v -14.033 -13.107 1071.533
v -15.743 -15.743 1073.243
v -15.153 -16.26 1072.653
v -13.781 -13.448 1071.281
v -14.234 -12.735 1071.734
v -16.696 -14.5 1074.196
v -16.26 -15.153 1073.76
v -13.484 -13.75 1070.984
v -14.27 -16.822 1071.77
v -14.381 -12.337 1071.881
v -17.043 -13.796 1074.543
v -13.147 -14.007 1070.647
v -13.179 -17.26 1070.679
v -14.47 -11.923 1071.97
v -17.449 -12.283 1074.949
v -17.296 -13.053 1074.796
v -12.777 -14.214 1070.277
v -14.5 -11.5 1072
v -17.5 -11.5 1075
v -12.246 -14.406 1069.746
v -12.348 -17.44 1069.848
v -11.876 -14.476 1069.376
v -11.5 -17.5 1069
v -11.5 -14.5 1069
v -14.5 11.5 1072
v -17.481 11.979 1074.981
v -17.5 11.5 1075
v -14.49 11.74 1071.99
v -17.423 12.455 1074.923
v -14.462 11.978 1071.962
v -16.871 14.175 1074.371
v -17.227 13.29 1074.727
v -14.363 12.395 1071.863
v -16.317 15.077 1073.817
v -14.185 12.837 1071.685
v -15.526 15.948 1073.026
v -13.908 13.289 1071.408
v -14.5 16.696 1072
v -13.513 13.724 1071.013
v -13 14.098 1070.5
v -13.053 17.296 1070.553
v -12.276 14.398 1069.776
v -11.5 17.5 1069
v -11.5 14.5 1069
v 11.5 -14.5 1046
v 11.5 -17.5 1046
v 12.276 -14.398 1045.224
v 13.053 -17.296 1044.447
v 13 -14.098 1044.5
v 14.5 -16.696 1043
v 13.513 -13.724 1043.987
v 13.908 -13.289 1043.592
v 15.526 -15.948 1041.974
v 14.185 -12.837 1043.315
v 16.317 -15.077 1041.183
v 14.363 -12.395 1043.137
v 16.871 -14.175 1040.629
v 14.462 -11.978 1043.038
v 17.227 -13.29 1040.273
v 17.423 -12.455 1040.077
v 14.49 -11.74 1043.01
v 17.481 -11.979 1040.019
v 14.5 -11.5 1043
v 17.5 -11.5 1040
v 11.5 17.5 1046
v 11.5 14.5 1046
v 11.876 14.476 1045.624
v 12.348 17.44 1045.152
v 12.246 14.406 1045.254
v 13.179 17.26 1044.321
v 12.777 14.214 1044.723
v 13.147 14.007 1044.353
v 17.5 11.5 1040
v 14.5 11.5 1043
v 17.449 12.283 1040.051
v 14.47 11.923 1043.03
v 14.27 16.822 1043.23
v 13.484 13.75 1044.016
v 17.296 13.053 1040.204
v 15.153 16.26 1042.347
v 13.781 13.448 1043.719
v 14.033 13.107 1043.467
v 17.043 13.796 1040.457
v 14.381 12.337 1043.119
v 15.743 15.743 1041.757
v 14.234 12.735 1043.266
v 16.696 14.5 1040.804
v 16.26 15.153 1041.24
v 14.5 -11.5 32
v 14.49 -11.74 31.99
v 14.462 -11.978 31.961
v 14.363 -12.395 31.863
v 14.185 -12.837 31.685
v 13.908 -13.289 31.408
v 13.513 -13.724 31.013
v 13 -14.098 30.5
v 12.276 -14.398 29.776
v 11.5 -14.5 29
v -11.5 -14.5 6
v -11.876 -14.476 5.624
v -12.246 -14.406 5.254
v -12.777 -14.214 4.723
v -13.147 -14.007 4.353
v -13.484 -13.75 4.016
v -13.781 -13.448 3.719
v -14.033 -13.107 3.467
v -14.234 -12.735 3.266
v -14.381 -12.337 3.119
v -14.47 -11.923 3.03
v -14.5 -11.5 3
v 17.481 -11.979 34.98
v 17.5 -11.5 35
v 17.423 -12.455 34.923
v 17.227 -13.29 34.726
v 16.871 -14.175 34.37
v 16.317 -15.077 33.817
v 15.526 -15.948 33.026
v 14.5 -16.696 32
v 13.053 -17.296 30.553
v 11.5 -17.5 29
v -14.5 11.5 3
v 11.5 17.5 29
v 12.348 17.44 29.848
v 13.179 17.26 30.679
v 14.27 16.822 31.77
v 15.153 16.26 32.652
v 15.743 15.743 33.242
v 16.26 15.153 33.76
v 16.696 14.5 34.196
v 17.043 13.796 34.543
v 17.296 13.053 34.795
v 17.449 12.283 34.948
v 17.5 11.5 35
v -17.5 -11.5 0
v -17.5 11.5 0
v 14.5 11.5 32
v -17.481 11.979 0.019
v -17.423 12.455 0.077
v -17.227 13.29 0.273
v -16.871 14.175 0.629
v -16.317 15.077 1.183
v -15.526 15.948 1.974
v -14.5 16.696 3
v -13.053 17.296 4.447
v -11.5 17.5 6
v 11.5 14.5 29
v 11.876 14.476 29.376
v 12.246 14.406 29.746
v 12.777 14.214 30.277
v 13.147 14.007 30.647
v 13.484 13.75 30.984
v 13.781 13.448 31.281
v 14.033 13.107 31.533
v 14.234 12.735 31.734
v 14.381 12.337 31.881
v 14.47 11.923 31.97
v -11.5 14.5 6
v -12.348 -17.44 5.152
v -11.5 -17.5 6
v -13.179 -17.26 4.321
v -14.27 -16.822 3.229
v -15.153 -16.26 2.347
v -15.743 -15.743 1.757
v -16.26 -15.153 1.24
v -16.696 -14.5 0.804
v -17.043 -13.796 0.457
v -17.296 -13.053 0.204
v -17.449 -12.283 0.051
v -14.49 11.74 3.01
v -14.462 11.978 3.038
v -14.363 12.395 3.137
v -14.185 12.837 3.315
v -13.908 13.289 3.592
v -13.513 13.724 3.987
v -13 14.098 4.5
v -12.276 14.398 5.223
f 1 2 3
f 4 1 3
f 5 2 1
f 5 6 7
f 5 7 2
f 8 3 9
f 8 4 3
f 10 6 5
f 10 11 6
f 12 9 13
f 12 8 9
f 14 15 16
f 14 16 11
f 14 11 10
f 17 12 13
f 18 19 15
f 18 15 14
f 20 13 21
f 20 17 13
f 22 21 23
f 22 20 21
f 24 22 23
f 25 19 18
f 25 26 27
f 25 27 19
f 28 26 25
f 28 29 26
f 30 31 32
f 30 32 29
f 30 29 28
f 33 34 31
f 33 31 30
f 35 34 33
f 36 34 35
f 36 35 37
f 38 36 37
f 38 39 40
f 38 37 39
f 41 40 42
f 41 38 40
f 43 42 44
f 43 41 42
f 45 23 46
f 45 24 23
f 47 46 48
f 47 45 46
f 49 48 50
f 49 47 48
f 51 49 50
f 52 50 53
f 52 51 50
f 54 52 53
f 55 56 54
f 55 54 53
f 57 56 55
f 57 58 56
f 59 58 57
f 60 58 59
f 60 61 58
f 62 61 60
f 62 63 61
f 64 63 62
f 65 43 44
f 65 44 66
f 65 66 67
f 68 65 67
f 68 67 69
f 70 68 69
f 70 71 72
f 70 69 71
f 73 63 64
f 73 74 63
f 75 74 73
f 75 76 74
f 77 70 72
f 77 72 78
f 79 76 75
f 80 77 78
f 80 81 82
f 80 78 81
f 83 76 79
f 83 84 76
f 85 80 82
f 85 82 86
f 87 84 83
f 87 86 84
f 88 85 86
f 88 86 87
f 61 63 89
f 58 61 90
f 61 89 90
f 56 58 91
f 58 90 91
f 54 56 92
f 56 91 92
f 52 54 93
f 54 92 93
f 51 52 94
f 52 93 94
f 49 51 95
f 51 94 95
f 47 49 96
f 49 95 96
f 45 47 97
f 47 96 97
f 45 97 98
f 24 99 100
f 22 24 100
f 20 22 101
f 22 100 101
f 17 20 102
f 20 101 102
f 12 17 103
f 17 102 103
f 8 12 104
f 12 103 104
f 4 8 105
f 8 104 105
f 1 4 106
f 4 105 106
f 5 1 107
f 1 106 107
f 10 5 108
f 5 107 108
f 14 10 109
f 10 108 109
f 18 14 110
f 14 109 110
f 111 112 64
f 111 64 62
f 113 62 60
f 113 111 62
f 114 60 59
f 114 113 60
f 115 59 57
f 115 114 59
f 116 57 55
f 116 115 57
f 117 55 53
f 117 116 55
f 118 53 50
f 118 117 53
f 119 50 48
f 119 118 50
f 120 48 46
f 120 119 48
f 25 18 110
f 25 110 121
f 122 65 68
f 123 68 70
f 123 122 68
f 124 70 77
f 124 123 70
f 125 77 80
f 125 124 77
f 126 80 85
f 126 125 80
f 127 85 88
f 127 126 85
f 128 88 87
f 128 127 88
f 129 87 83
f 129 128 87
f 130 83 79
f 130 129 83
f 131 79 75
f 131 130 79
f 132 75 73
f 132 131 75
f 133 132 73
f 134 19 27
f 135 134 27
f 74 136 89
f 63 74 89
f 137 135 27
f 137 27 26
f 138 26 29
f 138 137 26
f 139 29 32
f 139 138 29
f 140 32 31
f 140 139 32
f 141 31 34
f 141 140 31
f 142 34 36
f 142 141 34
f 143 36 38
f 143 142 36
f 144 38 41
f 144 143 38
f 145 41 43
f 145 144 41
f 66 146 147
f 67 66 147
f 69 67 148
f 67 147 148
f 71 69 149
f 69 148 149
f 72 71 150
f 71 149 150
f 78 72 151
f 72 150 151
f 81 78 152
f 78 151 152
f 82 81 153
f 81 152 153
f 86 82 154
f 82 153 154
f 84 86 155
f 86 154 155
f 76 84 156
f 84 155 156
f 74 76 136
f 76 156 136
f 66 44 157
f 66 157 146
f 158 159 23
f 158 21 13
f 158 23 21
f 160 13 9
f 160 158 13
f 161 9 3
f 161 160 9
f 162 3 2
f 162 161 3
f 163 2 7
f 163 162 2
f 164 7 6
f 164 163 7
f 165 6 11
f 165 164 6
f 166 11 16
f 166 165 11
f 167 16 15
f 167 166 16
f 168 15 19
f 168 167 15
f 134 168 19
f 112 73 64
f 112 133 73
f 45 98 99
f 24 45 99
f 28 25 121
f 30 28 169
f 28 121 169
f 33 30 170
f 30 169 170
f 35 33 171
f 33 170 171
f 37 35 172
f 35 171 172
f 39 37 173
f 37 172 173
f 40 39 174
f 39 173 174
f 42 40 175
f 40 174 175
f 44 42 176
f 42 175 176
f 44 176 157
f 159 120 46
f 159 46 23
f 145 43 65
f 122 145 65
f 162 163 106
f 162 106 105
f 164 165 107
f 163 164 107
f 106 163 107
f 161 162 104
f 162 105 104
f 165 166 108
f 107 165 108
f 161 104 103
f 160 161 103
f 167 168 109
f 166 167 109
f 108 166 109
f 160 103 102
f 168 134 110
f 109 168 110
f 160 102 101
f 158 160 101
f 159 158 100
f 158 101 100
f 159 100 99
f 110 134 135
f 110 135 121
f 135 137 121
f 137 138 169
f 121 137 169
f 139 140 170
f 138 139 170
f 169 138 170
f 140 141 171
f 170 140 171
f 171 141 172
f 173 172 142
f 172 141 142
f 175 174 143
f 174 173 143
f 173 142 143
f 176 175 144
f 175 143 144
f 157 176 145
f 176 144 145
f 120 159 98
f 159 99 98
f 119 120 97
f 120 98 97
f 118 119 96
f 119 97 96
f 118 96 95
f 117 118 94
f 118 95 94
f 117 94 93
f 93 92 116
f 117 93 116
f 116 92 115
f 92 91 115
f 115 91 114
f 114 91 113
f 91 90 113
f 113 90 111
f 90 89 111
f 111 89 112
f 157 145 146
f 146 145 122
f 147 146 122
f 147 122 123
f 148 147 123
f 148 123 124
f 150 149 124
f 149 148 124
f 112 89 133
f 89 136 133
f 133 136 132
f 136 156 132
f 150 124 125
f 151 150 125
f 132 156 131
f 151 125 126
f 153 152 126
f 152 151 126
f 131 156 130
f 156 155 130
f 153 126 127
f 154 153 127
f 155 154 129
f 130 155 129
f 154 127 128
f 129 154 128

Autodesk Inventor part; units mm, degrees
ref_plane "YZ Plane" through (0, 0, 0) normal (1, 0, 0) x (0, 1, 0)
ref_plane "Počáteční rovina" through (0, 0, 0) normal (0, 0, 1) x (1, 0, 0)
ref_plane "Koncová rovina" through (0, 0, 1075) normal (0, 0, 1) x (1, 0, 0)
sketch "Náčrt1" plane through (0, 0, 0) normal (0, 0, 1) x (1, 0, 0)
  line L0 (-11.5, 17.5) -> (11.5, 17.5)
  line L1 (17.5, 11.5) -> (17.5, -11.5)
  line L2 (11.5, -17.5) -> (-11.5, -17.5)
  line L3 (-17.5, -11.5) -> (-17.5, 11.5)
  arc A0 (-11.5, 17.5) -> (-17.5, 11.5) centre (-11.5, 11.5) ccw
  arc A1 (17.5, 11.5) -> (11.5, 17.5) centre (11.5, 11.5) ccw
  arc A2 (11.5, -17.5) -> (17.5, -11.5) centre (11.5, -11.5) ccw
  arc A3 (-17.5, -11.5) -> (-11.5, -17.5) centre (-11.5, -11.5) ccw
  line L4 (-21.8698, 0) -> (21.8698, 0) construction
  line L5 (0, -21.8698) -> (0, 21.8698) construction
  arc A4 (-11.5, 14.5) -> (-14.5, 11.5) centre (-11.5, 11.5) ccw
  line L6 (-11.5, 14.5) -> (11.5, 14.5)
  arc A5 (14.5, 11.5) -> (11.5, 14.5) centre (11.5, 11.5) ccw
  line L7 (14.5, 11.5) -> (14.5, -11.5)
  arc A6 (11.5, -14.5) -> (14.5, -11.5) centre (11.5, -11.5) ccw
  line L8 (11.5, -14.5) -> (-11.5, -14.5)
  arc A7 (-14.5, -11.5) -> (-11.5, -14.5) centre (-11.5, -11.5) ccw
  line L9 (-14.5, -11.5) -> (-14.5, 11.5)
  point P0 (-17.5, 17.5)
  point P1 (17.5, -17.5)
  point P2 (17.5, 17.5)
  dimension "b" = 35
  dimension "msp_r" = 6
  dimension "d8" = 17.5
  dimension "d9" = 17.5
  dimension "d10" = 3
extrude "Těleso" add sketch "Náčrt1" along normal up to surface (1075 mm away) from surface at 0
sketch "Sketch2" plane through (0, 0, 0) normal (0, 0, 1) x (1, 0, 0)
  line L0 (0, 0) -> (10, 0)
ref_plane "Work Plane3" through (0, 0, 0) normal (0, -1, 0) x (1, 0, 0)
sketch "Sketch3" plane through (0, 0, 0) normal (0, -1, 0) x (1, 0, 0)
  line L0 (-2, 0) -> (12, 0)
  line L1 (-2, 1075) -> (12, 1075)
  dimension "d14" = 1075
sketch "Náčrt4" plane through (11.5, 17.5, 1075) normal (0, 1, 0) x (1, 0, 0)
  line L0 (-23, 1075) -> (-29, 1075) projected
  line L1 (6, 1075) -> (6, 0) projected
  line L2 (-29, 1075) -> (6, 1075)
  line L3 (6, 1075) -> (6, 1040.0004)
  line L4 (-29, 1075) -> (6, 1040.0004)
  line L5 (6, 0) -> (6, 35)
  line L6 (-23, 0) -> (-29, 0) projected
  line L7 (-29, 0) -> (6, 35)
  line L8 (-29, 0) -> (6, 0)
  point P0 (-11.5, 1075)
  point P1 (-26, 0)
  dimension "d15" = 45
  dimension "d16" = 45
extrude "Vysunutí2" cut sketch "Náčrt4" against normal through all
equation "\"msp_r\" = 2 * ParT"
equation "\"d8\" = d9"
equation "\"d9\" = 0.5 * b"
equation "\"d10\" = ParT"
equation "\"G_OFFSET_START\" = 0"
equation "\"G_OFFSET_END\" = 0"
equation "\"d12\" = G_OFFSET_END + B_L"
equation "\"G_L\" = d14"
equation "\"B_L\" = 1075"
equation "\"ParT\" = 3"
properties part number "CSN 426935 - 35x35x3-1075" material "Nerezová ocel"
